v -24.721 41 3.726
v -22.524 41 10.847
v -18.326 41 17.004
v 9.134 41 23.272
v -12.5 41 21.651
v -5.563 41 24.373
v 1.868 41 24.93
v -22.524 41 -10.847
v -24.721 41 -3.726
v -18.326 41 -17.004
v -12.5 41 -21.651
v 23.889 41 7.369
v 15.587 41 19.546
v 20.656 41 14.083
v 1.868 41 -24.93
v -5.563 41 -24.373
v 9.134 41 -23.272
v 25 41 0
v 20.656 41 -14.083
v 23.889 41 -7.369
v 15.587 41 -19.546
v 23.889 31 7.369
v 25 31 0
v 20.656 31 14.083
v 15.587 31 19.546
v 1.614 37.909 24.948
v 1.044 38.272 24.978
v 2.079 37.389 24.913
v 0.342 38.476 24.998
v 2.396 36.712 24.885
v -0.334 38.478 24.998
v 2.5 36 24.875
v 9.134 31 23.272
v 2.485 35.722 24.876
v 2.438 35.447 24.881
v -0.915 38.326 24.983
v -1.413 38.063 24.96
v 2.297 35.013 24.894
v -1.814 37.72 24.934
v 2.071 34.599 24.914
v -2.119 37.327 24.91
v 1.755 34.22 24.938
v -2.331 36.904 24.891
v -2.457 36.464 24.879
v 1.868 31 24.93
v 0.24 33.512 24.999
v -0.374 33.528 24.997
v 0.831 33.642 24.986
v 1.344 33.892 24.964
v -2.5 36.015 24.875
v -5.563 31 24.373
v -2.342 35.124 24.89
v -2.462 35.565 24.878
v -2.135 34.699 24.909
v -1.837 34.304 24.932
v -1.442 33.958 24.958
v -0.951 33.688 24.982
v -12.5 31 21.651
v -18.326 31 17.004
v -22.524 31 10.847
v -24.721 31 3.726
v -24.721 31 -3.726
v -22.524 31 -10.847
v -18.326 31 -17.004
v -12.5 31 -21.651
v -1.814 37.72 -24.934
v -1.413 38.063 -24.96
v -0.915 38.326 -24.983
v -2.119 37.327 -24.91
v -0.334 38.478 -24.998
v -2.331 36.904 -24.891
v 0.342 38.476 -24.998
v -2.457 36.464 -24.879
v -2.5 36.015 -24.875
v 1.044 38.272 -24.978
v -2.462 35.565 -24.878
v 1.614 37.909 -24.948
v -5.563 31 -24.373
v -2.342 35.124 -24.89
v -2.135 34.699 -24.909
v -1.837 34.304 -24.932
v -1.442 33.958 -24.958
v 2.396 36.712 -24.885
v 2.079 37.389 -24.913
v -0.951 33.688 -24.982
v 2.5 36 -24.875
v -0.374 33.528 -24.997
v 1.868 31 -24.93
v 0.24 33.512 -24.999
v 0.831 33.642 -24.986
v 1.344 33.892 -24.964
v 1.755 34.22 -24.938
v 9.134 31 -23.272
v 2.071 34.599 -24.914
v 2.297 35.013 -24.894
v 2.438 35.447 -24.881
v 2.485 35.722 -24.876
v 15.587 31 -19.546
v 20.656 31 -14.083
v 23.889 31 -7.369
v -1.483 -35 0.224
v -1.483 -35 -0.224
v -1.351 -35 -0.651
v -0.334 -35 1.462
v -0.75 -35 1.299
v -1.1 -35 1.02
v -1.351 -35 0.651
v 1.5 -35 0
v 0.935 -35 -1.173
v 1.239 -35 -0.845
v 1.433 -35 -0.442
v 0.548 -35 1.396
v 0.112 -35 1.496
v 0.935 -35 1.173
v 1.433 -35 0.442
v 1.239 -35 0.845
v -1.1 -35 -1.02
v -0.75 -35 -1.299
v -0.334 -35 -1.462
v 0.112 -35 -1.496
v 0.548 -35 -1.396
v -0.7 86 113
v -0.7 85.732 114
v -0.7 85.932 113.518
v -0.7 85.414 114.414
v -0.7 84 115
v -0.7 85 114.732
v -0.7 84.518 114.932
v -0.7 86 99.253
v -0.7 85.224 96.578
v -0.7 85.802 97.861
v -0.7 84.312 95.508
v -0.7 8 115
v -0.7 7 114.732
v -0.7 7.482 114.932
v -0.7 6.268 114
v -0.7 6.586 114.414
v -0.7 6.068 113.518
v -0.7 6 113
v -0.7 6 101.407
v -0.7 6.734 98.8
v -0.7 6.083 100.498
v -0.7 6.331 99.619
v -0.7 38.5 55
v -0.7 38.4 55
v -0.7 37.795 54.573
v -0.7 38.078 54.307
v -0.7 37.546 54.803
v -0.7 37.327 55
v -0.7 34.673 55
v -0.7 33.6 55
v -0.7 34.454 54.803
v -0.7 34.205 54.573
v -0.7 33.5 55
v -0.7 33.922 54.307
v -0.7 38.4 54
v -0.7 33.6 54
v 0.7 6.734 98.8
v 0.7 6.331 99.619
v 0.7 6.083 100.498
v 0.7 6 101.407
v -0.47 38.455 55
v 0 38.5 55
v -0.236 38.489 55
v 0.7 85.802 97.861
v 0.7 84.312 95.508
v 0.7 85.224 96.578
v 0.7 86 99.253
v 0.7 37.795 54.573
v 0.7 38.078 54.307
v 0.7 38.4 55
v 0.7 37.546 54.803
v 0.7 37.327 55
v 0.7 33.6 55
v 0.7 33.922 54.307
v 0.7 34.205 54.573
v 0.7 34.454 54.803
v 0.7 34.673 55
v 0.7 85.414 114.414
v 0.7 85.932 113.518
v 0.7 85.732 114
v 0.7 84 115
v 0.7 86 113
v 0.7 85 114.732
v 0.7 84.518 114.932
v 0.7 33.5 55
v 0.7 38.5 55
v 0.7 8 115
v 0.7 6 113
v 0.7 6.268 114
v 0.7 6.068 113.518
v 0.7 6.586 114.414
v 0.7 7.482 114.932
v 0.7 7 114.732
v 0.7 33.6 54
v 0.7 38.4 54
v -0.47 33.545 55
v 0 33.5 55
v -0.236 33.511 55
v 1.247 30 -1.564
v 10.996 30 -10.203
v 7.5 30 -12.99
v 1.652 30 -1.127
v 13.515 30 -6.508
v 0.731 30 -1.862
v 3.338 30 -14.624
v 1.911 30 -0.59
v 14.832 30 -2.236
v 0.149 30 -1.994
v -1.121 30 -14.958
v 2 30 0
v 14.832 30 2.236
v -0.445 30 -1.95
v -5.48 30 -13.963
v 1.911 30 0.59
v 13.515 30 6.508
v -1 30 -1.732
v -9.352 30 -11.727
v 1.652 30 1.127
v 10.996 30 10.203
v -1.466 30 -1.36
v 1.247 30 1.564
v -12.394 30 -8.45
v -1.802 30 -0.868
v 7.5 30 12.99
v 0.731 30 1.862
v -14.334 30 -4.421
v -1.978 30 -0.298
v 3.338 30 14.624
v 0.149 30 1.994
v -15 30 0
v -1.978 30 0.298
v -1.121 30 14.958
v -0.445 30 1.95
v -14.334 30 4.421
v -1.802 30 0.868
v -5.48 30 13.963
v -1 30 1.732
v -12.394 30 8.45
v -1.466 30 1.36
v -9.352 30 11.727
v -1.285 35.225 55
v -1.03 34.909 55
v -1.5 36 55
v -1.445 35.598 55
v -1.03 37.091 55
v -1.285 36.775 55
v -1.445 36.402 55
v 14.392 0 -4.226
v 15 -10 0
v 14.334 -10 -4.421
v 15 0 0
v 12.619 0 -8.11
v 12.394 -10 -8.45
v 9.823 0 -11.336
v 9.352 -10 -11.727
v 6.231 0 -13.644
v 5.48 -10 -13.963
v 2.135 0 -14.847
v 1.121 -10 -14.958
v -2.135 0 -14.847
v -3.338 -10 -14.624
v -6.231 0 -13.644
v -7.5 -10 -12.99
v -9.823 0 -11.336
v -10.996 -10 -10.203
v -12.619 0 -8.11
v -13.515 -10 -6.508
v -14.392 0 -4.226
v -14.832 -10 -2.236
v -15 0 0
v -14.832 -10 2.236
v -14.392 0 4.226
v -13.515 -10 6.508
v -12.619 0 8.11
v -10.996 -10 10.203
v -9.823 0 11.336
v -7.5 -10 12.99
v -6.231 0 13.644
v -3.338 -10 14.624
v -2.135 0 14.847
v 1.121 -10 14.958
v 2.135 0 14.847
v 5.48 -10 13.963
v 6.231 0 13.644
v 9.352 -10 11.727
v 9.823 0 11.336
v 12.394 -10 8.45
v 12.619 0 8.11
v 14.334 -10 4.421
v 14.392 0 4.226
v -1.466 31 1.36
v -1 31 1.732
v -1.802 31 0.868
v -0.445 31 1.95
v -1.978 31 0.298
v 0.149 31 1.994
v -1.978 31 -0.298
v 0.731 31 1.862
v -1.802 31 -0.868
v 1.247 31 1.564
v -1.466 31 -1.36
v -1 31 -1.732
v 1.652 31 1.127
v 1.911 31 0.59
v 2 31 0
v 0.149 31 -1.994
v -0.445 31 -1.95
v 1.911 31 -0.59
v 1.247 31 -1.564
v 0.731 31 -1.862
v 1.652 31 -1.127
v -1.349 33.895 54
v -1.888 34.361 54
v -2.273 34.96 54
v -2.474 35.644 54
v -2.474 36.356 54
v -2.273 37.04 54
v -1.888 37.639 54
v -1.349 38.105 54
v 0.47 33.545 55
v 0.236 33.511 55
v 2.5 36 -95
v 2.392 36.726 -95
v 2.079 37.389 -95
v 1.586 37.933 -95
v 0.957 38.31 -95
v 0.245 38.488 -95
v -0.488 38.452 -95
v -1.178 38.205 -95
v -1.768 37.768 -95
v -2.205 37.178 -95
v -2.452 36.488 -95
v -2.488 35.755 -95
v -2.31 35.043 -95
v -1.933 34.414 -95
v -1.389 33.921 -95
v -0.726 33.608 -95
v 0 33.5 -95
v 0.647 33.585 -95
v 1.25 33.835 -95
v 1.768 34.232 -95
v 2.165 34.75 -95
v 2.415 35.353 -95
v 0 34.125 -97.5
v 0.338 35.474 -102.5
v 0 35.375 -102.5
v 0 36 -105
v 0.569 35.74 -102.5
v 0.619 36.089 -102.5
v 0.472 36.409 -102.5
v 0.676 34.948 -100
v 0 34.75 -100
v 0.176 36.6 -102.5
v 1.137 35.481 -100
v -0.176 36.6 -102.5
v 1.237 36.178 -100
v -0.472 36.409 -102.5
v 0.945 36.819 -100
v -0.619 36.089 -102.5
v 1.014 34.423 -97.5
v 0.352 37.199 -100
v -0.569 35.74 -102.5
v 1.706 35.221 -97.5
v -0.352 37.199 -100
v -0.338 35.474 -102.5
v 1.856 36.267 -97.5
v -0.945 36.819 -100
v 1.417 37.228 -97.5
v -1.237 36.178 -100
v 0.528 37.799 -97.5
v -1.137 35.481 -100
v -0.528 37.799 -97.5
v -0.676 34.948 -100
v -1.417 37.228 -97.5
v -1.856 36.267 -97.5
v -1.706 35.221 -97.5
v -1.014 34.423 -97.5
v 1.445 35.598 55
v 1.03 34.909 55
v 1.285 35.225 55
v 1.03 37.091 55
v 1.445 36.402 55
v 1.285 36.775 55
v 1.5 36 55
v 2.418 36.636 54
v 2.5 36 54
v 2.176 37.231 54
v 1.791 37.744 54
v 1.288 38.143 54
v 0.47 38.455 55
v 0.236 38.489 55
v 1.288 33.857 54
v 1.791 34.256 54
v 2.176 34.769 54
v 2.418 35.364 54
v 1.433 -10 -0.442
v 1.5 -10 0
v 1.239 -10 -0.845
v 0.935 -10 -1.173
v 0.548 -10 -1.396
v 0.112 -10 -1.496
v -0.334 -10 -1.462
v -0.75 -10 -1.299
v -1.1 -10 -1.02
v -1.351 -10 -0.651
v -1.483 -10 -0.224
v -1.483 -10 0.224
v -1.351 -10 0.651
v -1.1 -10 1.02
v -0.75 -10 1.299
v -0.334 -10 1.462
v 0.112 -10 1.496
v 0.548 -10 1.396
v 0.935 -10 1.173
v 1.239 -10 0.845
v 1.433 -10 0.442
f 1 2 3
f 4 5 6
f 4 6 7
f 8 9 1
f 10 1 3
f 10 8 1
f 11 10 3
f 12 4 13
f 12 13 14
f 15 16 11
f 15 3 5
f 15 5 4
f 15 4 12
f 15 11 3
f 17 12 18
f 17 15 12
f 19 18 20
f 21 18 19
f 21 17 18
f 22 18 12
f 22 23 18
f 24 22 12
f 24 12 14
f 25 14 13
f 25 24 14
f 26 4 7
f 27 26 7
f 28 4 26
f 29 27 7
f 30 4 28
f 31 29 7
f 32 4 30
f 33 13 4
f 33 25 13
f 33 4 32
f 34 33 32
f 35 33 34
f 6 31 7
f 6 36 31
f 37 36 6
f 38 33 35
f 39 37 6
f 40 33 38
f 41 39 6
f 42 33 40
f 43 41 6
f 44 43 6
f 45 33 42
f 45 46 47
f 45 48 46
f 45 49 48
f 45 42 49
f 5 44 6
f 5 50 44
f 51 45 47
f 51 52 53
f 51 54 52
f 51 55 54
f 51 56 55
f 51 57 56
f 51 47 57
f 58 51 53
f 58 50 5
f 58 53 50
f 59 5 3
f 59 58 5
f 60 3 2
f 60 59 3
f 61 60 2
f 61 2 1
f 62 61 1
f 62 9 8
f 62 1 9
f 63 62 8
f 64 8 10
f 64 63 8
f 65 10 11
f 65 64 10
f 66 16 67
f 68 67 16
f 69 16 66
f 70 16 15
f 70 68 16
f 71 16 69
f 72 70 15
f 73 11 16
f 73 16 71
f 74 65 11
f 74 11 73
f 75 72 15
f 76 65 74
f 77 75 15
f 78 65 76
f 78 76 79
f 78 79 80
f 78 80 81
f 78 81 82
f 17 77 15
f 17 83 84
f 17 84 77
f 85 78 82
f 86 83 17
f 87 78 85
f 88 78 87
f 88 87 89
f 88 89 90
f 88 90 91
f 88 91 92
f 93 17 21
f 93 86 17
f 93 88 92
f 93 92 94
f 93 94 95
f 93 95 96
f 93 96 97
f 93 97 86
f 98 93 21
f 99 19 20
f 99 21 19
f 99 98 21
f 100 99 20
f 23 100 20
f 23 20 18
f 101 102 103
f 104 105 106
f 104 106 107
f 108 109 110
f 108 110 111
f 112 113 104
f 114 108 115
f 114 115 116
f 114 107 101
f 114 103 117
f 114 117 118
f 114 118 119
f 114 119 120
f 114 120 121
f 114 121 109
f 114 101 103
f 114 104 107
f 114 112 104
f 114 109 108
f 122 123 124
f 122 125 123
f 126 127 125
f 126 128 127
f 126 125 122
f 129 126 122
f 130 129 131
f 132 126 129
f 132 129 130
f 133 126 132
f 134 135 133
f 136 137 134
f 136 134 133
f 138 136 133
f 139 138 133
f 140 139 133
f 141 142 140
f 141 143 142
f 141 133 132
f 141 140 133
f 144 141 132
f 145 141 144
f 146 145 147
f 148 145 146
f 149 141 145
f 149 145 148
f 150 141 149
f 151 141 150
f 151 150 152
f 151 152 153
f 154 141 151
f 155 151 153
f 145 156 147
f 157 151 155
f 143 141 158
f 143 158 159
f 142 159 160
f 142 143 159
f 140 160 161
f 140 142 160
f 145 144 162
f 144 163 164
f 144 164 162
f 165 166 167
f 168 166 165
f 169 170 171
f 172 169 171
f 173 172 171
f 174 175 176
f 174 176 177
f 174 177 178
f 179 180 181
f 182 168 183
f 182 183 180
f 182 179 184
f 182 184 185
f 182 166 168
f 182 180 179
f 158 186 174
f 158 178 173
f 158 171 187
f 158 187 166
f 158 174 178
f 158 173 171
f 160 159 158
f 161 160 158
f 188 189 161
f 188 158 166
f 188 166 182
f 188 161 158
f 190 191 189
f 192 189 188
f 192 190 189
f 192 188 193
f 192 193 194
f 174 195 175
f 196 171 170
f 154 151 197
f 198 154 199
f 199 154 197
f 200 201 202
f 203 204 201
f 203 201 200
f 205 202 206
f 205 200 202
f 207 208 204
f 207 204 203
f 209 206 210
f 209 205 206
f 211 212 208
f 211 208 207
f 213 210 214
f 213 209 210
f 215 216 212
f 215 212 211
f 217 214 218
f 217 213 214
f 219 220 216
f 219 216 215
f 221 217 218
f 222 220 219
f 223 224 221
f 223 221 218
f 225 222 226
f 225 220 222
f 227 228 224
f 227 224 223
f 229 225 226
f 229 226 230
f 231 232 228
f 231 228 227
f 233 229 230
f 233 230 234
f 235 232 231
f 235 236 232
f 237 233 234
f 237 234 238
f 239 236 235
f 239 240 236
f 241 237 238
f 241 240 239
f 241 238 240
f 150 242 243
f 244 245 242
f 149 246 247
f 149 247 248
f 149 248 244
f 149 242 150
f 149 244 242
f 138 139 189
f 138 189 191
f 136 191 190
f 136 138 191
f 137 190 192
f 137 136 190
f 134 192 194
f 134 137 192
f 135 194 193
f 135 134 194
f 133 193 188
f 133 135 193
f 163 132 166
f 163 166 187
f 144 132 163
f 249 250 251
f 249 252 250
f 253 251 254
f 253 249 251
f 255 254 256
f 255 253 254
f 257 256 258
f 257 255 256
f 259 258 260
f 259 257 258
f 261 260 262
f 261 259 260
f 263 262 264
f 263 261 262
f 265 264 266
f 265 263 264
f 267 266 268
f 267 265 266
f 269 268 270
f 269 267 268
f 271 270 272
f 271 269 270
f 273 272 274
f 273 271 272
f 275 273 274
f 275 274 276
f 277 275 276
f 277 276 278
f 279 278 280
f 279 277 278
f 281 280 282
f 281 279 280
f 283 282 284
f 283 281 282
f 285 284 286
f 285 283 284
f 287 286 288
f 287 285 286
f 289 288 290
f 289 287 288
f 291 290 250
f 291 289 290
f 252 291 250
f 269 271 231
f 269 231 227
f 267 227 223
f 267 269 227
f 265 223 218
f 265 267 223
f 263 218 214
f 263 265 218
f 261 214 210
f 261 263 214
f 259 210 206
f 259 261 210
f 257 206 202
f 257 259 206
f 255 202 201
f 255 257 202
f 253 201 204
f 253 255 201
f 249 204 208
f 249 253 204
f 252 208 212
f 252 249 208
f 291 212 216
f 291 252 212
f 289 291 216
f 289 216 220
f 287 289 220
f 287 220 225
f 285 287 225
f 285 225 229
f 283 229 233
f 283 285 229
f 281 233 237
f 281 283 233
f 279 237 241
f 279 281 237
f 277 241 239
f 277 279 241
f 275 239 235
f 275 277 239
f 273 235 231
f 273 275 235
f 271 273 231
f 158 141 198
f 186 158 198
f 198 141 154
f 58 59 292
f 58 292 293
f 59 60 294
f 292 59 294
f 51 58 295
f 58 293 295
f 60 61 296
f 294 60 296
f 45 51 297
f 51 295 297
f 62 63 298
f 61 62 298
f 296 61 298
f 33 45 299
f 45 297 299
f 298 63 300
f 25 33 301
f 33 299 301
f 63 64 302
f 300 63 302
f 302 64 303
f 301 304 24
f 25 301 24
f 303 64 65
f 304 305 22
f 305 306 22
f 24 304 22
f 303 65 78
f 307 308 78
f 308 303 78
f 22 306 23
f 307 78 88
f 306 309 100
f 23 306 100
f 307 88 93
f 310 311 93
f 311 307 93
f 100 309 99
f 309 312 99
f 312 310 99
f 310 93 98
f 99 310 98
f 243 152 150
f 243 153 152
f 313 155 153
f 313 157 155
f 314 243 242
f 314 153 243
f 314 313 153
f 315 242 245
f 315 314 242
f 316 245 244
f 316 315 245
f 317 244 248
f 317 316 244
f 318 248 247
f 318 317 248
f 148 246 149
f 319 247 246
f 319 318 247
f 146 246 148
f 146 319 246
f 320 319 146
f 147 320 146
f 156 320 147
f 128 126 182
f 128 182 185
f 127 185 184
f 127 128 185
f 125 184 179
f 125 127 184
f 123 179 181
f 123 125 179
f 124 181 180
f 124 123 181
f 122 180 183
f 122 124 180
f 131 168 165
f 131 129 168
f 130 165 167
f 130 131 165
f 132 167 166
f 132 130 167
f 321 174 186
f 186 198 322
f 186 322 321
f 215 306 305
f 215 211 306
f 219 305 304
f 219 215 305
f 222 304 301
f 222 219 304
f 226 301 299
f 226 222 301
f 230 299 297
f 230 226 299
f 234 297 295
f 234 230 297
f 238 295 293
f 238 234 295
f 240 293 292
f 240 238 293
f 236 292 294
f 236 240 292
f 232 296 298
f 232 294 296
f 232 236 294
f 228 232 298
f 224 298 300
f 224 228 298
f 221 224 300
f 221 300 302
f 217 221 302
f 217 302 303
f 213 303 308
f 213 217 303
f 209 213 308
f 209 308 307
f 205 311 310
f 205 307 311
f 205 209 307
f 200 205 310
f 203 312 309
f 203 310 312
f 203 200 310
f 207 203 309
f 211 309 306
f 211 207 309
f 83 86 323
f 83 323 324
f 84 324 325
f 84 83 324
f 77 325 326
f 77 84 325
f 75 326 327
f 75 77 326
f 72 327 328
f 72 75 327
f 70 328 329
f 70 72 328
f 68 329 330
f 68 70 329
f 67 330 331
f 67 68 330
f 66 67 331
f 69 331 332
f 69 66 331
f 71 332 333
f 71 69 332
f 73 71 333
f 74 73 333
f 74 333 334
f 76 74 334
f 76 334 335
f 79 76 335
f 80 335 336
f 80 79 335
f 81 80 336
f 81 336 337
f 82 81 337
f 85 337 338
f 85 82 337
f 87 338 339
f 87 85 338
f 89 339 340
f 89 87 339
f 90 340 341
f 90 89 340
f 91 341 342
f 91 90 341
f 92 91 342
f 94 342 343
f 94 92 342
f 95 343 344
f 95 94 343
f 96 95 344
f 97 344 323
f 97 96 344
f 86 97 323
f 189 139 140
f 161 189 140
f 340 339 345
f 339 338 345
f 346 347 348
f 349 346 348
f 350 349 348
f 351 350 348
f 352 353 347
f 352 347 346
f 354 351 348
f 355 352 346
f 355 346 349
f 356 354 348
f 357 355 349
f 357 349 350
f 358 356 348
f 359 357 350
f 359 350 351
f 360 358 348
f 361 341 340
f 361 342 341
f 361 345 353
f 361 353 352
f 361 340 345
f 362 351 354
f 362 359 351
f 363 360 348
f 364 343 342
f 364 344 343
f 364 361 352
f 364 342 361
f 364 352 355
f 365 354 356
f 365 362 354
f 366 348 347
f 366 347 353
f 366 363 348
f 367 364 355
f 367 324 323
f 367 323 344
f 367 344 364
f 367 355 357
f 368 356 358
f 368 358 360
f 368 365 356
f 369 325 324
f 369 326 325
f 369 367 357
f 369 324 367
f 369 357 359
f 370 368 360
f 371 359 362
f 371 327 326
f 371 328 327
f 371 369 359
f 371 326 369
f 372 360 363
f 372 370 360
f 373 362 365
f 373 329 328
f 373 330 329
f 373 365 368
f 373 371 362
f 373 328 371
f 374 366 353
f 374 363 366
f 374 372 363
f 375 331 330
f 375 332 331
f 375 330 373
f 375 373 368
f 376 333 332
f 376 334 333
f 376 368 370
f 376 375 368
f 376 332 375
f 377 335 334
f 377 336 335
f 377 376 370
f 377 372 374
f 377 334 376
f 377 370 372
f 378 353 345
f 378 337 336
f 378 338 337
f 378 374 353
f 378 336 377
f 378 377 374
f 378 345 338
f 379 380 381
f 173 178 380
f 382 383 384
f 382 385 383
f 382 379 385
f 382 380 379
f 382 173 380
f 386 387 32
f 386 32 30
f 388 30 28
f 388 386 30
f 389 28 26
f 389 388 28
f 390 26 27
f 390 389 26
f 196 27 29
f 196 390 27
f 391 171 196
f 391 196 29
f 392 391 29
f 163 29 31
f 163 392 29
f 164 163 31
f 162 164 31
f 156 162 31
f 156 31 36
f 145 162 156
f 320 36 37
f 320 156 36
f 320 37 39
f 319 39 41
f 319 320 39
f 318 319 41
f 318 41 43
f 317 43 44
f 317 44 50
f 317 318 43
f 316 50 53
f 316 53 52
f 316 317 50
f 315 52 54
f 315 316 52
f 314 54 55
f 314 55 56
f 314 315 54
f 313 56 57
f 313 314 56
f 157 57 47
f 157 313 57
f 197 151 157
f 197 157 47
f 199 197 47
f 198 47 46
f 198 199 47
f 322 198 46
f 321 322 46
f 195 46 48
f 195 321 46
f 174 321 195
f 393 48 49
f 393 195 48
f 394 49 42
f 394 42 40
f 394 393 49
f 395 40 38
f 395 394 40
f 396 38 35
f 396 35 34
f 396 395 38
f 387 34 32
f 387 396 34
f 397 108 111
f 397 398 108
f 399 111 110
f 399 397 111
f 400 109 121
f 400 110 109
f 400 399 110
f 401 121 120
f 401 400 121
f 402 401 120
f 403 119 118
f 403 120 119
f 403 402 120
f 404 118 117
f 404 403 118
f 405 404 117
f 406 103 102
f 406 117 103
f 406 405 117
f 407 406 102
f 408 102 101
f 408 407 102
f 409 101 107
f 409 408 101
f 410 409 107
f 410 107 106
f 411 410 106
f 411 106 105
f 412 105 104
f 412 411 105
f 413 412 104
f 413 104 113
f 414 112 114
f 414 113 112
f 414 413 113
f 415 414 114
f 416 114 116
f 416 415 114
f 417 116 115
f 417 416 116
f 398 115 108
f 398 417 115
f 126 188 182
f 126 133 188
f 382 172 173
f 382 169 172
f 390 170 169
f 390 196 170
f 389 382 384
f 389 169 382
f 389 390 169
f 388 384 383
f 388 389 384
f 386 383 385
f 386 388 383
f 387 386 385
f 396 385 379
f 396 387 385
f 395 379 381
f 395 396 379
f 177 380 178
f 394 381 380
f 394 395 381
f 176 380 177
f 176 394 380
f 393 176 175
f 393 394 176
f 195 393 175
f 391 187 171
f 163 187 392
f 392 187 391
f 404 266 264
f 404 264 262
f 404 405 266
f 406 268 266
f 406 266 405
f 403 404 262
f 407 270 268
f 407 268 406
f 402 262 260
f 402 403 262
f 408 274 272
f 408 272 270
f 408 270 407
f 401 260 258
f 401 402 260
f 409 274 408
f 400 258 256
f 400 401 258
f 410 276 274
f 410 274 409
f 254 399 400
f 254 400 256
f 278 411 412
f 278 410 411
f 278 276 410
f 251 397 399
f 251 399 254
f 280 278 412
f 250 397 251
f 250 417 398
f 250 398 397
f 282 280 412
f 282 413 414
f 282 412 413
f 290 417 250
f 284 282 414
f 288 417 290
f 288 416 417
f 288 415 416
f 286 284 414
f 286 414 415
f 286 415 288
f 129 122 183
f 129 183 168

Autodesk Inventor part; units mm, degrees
ref_plane "YZ Plane" through (0, 0, 0) normal (1, 0, 0) x (0, 1, 0)
ref_plane "XZ Plane" through (0, 0, 0) normal (0, 1, 0) x (-1, 0, 0)
sketch "Esboço1" plane through (0, 0, 0) normal (0, 1, 0) x (-1, 0, 0)
  circle A0 centre (0, 0) radius 15
  dimension "d0" = 30
extrude "Extrusão1" add sketch "Esboço1" along normal blind 30
sketch "Esboço2" plane through (0, 30, 0) normal (0, 1, 0) x (1, 0, 0)
  circle A0 centre (0, 0) radius 2
  dimension "d3" = 4
extrude "Extrusão2" add sketch "Esboço2" along normal blind 1
sketch "Esboço3" plane through (0, 31, 0) normal (0, 1, 0) x (1, 0, 0)
  circle A0 centre (0, 0) radius 25
  dimension "d6" = 50
extrude "Extrusão3" add sketch "Esboço3" along normal blind 10
ref_plane "Plano de trabalho1" through (0, 31, -25) normal (0, 0, 1) x (1, 0, 0)
sketch "Esboço4" plane through (0, 31, -25) normal (0, 0, 1) x (1, 0, 0)
  line L0 (2, 0) -> (-2, 0) projected
  line L1 (0, 0) -> (0, 10)
  line L2 (25, 10) -> (-25, 10) projected
  circle A0 centre (0, 5) radius 2.5
  point P0 (0, -31)
  dimension "d9" = 5
extrude "Extrusão4" add sketch "Esboço4" along normal blind 80 and the other way blind 70
sketch "Esboço5" plane through (0, 0, 0) normal (1, 0, 0) x (0, 1, 0)
  line L0 (33.5, -95) -> (38.5, -95) projected
  line L1 (36, -95) -> (36, -105)
  line L2 (36, -95) -> (46, -95) construction
  line L3 (36, -105) -> (33.5, -95)
  line L4 (36, -95) -> (33.5, -95)
  point P0 (0, 0)
  dimension "d14" = 10
  dimension "d15" = 90
revolve "Revolução1" add sketch "Esboço5" angle 360 about axis through (0, 36, -95) along (0, 0, -1)
sketch "Esboço6" plane through (0, 0, 0) normal (1, 0, 0) x (0, 1, 0)
  line L0 (38.5, 55) -> (33.5, 55) projected
  line L1 (33.5, 25) -> (33.5, 55) projected
  line L2 (38.5, 25) -> (38.5, 55) projected
  line L3 (33.5, 55) -> (38.5, 55)
  line L4 (6, 113) -> (6, 101.4068)
  line L5 (6.7336, 98.7996) -> (33.5, 55)
  line L6 (8, 115) -> (84, 115)
  line L7 (86, 113) -> (86, 99.2532)
  line L8 (84.312, 95.5075) -> (38.5, 55)
  arc A0 (84.312, 95.5075) -> (86, 99.2532) centre (81, 99.2532) ccw
  arc A1 (6, 101.4068) -> (6.7336, 98.7996) centre (11, 101.4068) ccw
  arc A2 (8, 115) -> (6, 113) centre (8, 113) ccw
  arc A3 (86, 113) -> (84, 115) centre (84, 113) ccw
  point P0 (0, 0)
  point P1 (6, 115)
  point P2 (86, 115)
  point P3 (86, 97)
  dimension "d27" = 80
  dimension "d28" = 18
  dimension "d29" = 5
  dimension "d30" = 2
extrude "Extrusão5" add sketch "Esboço6" along normal mid plane 1.4
chamfer "Chanfro1" distance 1 angle 45 2 edges at (2, 34.5, 55) (-2.5, 36, 55)
sketch "Esboço7" plane through (0, 0, 0) normal (0, -1, 0) x (1, 0, 0)
  circle A0 centre (0, 0) radius 15
extrude "Extrusão6" add sketch "Esboço7" along normal blind 10
sketch "Esboço8" plane through (0, -10, 0) normal (0, -1, 0) x (1, 0, 0)
  circle A0 centre (0, 0) radius 1.5
  dimension "d39" = 3
extrude "Extrusão7" add sketch "Esboço8" along normal blind 25
thread "Rosca1" size "M3x0.5" class "6g" standard "ANSI Metric M Profile" full length
properties part number "wind_vane"
